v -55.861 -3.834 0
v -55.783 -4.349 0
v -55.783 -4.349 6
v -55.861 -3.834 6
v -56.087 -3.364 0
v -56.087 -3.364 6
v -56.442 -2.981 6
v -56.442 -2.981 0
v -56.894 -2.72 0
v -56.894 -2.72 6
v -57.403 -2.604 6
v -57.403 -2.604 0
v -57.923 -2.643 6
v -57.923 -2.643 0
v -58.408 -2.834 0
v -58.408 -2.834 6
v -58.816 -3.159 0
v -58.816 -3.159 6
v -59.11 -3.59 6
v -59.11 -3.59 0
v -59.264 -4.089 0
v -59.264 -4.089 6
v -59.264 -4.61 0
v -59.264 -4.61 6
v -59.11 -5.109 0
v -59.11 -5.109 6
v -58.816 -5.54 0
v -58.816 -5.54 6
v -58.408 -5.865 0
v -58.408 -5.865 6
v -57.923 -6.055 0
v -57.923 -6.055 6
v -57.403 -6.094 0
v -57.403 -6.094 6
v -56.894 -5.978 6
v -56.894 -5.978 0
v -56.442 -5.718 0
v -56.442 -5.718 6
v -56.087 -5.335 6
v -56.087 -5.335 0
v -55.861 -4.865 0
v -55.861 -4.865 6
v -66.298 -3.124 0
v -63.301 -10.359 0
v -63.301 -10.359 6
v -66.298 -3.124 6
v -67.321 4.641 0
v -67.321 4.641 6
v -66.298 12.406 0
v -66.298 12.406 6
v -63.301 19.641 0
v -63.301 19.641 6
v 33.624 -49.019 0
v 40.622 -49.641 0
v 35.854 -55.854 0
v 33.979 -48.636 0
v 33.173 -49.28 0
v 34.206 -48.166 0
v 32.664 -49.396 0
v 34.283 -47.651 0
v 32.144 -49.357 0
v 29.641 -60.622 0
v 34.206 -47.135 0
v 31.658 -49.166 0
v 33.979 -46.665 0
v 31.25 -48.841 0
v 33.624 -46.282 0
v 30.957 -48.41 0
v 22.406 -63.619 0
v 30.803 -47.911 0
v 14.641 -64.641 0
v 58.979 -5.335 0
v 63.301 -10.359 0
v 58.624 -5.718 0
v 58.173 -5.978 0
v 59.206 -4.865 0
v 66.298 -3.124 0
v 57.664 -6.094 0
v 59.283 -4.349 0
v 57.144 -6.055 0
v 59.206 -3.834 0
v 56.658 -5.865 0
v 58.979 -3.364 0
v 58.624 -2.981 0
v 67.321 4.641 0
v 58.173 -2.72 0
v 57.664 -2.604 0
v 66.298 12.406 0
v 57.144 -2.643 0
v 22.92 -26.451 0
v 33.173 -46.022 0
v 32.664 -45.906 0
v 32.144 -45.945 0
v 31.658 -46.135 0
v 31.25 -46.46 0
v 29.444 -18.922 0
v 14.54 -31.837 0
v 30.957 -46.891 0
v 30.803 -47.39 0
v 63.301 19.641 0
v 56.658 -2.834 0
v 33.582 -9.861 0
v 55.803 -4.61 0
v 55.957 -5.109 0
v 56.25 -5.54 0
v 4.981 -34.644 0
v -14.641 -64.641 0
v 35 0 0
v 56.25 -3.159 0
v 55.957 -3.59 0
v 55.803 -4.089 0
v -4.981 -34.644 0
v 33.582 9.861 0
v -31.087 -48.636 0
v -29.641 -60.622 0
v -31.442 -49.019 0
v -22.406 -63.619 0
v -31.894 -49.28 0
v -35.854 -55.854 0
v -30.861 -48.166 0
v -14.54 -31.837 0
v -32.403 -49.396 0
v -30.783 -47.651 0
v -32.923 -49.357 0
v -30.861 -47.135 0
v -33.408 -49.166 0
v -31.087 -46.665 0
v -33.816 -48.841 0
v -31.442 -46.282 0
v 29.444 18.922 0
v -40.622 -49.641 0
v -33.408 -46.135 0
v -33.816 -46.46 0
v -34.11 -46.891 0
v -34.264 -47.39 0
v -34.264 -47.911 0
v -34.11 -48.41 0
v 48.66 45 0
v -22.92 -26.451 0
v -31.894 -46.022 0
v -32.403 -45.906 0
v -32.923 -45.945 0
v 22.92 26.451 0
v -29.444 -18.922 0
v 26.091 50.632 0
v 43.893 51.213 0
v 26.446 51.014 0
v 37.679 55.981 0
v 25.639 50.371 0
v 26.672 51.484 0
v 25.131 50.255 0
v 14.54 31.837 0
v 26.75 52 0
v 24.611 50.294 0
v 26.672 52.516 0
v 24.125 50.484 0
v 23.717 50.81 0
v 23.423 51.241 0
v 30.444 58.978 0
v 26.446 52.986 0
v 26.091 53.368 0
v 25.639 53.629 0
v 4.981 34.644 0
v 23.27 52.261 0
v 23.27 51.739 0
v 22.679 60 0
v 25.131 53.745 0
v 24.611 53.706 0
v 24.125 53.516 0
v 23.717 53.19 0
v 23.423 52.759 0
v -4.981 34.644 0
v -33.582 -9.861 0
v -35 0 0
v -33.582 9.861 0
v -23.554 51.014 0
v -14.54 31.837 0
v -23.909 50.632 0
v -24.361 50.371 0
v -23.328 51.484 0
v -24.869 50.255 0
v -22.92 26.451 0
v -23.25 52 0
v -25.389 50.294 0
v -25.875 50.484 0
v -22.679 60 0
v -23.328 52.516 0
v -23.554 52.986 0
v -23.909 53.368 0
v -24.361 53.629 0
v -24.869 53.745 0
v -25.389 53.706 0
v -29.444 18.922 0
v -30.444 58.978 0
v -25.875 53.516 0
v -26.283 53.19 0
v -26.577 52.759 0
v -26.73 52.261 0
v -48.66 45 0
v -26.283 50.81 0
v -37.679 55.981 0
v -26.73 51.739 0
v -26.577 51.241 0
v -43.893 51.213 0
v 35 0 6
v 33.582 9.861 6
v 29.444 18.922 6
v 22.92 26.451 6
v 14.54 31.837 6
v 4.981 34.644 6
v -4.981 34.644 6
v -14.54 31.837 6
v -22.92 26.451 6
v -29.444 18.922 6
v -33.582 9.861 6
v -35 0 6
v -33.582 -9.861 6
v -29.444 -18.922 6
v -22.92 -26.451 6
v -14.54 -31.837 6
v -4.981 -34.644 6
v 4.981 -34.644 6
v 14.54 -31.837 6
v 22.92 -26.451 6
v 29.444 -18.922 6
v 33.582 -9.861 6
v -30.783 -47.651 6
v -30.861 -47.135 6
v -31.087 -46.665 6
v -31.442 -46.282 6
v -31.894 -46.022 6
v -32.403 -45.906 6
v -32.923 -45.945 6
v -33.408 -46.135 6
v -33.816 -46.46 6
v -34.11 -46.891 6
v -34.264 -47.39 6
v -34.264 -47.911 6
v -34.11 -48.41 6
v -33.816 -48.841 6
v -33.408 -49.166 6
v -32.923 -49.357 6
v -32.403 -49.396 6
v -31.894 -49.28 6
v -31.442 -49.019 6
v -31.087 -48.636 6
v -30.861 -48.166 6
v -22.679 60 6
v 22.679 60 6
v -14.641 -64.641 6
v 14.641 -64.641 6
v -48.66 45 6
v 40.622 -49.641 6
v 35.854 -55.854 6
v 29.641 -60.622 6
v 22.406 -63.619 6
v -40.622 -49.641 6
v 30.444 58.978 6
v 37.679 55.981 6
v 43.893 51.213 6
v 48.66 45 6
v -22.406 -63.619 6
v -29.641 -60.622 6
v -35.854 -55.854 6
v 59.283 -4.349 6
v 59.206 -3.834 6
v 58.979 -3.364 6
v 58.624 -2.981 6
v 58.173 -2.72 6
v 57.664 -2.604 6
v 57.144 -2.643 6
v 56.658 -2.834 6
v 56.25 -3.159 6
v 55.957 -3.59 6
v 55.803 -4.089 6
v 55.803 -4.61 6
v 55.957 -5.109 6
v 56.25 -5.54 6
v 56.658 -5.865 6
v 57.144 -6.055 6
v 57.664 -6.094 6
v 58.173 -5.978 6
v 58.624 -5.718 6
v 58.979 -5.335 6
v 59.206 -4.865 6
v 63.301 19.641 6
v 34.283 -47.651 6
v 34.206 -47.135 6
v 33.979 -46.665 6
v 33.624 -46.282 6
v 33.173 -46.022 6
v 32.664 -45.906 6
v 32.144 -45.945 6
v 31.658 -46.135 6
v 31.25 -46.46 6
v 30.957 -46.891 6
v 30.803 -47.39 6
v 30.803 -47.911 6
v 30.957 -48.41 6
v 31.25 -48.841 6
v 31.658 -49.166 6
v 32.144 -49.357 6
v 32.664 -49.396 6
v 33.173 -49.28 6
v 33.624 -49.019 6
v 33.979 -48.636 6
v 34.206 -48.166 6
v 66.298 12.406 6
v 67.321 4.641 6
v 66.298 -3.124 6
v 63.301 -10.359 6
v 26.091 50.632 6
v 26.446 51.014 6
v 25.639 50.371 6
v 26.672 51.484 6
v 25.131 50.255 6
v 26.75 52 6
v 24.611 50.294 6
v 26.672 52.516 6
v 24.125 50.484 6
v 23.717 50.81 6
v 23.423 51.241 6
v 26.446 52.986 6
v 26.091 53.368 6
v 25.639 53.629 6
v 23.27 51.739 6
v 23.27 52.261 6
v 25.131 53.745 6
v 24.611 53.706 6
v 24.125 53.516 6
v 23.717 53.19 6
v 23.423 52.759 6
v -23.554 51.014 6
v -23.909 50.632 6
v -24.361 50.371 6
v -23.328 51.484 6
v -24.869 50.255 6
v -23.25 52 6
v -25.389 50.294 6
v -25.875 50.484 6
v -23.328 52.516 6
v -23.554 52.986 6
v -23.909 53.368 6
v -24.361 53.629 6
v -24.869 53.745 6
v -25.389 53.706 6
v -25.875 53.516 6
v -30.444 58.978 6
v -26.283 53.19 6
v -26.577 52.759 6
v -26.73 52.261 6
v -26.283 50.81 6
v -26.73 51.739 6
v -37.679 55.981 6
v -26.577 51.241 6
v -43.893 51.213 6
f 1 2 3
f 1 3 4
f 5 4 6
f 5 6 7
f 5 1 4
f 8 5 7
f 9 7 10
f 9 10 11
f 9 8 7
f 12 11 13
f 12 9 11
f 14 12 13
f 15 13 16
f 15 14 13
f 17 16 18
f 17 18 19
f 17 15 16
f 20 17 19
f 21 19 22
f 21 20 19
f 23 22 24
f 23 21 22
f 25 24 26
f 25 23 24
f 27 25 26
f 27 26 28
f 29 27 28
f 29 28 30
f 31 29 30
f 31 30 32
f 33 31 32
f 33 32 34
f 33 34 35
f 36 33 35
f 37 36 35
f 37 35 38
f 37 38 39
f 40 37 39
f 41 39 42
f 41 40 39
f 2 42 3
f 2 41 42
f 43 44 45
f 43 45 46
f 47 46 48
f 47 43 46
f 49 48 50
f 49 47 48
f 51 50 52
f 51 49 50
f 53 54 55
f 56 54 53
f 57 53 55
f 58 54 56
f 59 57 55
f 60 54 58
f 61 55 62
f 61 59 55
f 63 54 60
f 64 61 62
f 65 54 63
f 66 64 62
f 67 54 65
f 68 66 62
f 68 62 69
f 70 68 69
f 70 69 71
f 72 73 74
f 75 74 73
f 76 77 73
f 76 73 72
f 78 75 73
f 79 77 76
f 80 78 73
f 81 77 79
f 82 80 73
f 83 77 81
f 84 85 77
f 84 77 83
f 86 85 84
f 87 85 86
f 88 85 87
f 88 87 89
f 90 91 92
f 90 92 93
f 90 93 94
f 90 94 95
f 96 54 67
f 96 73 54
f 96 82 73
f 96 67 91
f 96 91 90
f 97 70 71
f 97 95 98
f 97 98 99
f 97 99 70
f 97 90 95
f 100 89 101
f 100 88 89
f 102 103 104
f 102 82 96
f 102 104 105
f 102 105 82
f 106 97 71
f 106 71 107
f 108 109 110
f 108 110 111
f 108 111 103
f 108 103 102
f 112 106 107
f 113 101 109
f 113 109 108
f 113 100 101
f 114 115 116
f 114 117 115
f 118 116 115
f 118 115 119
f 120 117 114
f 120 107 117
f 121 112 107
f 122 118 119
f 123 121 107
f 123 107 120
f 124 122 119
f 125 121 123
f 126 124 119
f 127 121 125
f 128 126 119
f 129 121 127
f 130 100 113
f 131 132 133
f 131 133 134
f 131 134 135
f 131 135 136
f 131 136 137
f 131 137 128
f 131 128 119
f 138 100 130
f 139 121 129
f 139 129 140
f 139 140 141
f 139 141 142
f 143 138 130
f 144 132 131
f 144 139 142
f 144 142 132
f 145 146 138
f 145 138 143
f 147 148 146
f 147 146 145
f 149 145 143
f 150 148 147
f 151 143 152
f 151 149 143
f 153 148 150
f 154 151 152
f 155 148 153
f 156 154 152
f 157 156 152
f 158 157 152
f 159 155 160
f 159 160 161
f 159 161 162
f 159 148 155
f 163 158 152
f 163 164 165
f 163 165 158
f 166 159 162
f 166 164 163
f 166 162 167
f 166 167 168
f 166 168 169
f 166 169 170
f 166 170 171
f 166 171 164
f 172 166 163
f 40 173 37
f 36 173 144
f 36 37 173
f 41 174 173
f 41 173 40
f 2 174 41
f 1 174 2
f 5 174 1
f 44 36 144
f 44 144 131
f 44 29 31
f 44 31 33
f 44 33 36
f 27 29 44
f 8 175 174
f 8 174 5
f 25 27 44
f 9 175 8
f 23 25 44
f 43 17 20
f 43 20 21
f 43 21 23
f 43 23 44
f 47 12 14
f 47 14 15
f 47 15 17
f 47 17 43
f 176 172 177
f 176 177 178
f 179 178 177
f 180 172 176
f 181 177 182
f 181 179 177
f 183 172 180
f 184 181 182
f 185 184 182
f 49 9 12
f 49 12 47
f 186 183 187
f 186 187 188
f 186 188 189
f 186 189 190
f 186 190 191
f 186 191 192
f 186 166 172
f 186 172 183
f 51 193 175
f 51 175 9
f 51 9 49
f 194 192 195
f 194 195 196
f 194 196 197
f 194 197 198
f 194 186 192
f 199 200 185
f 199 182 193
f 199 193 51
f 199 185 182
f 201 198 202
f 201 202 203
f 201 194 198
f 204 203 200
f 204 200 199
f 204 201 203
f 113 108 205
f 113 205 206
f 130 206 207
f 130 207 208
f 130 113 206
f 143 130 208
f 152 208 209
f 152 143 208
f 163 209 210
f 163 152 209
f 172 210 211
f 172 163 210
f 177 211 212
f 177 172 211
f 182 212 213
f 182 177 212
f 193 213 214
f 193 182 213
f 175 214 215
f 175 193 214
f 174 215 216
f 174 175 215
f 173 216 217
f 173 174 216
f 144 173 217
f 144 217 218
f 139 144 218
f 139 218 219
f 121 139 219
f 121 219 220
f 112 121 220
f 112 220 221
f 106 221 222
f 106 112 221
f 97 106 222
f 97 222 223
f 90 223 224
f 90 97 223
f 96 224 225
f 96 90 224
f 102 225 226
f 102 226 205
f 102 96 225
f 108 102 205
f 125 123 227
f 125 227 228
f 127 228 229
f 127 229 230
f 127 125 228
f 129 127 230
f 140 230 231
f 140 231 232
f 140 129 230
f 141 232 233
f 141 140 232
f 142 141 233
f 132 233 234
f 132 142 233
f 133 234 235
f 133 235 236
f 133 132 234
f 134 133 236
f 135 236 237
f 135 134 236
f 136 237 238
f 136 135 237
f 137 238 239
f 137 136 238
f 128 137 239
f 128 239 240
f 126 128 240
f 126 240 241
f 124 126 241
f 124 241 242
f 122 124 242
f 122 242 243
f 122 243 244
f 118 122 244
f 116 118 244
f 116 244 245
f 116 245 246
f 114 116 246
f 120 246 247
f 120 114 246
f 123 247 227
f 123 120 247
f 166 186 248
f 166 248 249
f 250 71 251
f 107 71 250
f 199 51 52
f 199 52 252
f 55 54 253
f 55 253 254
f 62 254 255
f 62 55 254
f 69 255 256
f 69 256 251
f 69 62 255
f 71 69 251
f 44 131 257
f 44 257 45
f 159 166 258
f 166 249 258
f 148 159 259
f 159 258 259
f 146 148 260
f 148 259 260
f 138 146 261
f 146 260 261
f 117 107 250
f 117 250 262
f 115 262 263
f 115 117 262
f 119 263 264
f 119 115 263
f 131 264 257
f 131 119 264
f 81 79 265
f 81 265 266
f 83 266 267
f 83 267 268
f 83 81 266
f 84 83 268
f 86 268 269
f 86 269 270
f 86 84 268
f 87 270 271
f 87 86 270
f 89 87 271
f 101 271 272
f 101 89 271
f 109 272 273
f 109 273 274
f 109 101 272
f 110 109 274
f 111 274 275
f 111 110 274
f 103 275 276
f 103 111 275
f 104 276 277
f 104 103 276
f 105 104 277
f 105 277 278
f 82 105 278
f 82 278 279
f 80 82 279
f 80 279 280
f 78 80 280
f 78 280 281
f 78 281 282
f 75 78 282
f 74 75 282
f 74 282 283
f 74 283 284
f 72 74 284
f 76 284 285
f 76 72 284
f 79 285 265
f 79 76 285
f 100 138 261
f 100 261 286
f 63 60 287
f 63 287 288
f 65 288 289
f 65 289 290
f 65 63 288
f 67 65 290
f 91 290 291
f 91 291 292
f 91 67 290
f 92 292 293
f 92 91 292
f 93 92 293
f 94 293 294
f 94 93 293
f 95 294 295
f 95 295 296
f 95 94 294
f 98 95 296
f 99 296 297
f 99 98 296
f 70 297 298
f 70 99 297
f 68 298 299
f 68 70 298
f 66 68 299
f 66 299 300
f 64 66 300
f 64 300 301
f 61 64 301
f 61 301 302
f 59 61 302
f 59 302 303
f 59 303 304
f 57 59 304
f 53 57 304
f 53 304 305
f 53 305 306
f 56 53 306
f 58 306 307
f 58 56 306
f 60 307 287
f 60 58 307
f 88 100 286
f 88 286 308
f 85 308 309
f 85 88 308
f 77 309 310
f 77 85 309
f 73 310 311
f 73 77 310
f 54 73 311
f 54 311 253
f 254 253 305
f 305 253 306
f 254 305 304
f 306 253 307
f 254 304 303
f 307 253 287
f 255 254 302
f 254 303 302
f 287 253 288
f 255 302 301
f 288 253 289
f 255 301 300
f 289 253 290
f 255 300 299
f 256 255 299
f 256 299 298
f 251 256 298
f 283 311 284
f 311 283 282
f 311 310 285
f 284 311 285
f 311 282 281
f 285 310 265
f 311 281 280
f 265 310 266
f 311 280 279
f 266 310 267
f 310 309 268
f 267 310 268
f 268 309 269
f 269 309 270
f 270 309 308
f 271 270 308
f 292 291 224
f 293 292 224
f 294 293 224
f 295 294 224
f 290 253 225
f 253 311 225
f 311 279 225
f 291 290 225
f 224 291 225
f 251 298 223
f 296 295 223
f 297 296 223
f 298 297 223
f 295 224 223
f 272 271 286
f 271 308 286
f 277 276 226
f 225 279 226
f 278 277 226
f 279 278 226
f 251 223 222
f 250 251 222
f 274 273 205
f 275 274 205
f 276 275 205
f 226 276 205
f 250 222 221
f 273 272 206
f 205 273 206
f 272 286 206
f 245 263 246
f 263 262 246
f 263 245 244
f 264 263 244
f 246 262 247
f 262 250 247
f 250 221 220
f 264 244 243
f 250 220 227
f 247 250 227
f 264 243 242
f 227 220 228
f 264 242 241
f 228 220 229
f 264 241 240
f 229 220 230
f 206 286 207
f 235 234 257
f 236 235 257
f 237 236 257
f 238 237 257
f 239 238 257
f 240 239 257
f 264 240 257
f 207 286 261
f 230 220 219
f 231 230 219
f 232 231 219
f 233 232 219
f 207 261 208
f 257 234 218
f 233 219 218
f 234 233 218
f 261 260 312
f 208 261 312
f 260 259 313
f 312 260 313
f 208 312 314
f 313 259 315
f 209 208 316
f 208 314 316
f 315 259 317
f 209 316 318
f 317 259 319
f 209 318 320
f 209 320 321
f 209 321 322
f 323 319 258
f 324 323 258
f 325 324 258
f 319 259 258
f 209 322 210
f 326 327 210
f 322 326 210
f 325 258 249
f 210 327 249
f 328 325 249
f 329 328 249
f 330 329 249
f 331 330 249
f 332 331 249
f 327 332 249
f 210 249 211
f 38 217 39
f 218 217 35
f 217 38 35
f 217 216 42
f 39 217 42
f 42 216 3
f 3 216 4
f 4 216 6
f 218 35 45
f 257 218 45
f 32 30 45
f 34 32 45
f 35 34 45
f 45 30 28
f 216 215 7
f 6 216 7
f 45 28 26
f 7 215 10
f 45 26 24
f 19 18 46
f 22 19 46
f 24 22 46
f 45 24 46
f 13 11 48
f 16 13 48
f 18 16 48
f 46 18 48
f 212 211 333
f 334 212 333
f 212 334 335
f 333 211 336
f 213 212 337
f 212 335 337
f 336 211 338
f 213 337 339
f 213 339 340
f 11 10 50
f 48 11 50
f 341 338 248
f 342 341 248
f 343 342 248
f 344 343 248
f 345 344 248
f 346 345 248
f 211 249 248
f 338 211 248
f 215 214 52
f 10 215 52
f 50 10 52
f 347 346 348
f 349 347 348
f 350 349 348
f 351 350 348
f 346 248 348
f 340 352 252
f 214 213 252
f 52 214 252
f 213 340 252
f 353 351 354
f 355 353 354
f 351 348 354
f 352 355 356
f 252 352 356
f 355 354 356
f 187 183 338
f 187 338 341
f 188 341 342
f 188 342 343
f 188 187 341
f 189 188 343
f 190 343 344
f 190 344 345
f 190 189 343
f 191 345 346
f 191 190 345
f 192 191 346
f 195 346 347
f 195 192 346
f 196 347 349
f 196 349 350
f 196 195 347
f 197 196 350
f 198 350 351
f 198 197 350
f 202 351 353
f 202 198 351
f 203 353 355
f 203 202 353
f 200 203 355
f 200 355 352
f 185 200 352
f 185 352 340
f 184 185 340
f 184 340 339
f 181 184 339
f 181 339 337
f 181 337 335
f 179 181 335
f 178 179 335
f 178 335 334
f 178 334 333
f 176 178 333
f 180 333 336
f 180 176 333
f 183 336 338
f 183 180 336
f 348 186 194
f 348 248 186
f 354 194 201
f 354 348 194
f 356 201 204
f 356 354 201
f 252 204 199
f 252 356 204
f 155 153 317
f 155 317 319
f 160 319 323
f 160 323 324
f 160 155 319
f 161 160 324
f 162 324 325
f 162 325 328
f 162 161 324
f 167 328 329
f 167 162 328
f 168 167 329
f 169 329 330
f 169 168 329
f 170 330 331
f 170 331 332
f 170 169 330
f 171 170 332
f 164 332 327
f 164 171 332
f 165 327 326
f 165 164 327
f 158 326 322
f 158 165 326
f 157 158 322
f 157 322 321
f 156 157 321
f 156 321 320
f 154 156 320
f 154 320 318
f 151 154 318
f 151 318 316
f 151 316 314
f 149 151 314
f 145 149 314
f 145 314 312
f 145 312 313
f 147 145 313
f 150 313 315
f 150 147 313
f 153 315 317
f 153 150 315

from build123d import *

# Parameters (mm, degrees)
SKETCH5_R           = 35
SKETCH5_R_2         = 1.75
BOSS_EXTRUDE2_DEPTH = 6
FILLET1_R           = 30
CIRPATTERN3_DEPTH   = 6


# Read off the part's stored shape, not the designer's step: CirPattern3
with BuildPart() as part:
    # Sketch5 → Boss-Extrude2 (new body)
    with BuildSketch(Plane.XY):
        Polygon((-40, 60), (40, 60), (71.961524227, 4.641016151), (31.961524227, -64.641016151), (-31.961524227, -64.641016151), (-71.961524227, 4.641016151), align=None)
        Circle(SKETCH5_R, mode=Mode.SUBTRACT)
        with Locations((-25, 52)):
            Circle(SKETCH5_R_2, mode=Mode.SUBTRACT)
        with Locations((25, 52)):
            Circle(SKETCH5_R_2, mode=Mode.SUBTRACT)
        with Locations((57.533320997, -4.349364905)):
            Circle(SKETCH5_R_2, mode=Mode.SUBTRACT)
        with Locations((32.533320997, -47.650635095)):
            Circle(SKETCH5_R_2, mode=Mode.SUBTRACT)
        with Locations((-32.533320997, -47.650635095)):
            Circle(SKETCH5_R_2, mode=Mode.SUBTRACT)
        with Locations((-57.533320997, -4.349364905)):
            Circle(SKETCH5_R_2, mode=Mode.SUBTRACT)
    extrude(amount=BOSS_EXTRUDE2_DEPTH)

    # Fillet1
    fillet1_edges = [part.edges().sort_by_distance(p)[0] for p in [
        (-40, 60, 3),
        (40, 60, 3),
    ]]
    fillet(fillet1_edges, radius=FILLET1_R)

    # CirPattern3 outline → CirPattern3 (cut)
    with BuildSketch(Plane.XY):
        with BuildLine():
            Line((-71.961524227, 4.641016151), (-63.301270189, -10.358983849))
            ThreePointArc((-63.301270189, -10.358983849), (-67.320508076, 4.641016151), (-63.301270189, 19.641016151))
            Line((-63.301270189, 19.641016151), (-71.961524227, 4.641016151))
        make_face()
        with BuildLine():
            Line((-31.961524227, -64.641016151), (-14.641016151, -64.641016151))
            ThreePointArc((-14.641016151, -64.641016151), (-29.641016151, -60.621778265), (-40.621778265, -49.641016151))
            Line((-40.621778265, -49.641016151), (-31.961524227, -64.641016151))
        make_face()
        with BuildLine():
            Line((31.961524227, -64.641016151), (40.621778265, -49.641016151))
            ThreePointArc((40.621778265, -49.641016151), (29.641016151, -60.621778265), (14.641016151, -64.641016151))
            Line((14.641016151, -64.641016151), (31.961524227, -64.641016151))
        make_face()
        with BuildLine():
            ThreePointArc((63.301270189, 19.641016151), (67.320508076, 4.641016151), (63.301270189, -10.358983849))
            Line((63.301270189, -10.358983849), (71.961524227, 4.641016151))
            Line((71.961524227, 4.641016151), (63.301270189, 19.641016151))
        make_face()
    extrude(amount=CIRPATTERN3_DEPTH, mode=Mode.SUBTRACT)


solid = part.part
